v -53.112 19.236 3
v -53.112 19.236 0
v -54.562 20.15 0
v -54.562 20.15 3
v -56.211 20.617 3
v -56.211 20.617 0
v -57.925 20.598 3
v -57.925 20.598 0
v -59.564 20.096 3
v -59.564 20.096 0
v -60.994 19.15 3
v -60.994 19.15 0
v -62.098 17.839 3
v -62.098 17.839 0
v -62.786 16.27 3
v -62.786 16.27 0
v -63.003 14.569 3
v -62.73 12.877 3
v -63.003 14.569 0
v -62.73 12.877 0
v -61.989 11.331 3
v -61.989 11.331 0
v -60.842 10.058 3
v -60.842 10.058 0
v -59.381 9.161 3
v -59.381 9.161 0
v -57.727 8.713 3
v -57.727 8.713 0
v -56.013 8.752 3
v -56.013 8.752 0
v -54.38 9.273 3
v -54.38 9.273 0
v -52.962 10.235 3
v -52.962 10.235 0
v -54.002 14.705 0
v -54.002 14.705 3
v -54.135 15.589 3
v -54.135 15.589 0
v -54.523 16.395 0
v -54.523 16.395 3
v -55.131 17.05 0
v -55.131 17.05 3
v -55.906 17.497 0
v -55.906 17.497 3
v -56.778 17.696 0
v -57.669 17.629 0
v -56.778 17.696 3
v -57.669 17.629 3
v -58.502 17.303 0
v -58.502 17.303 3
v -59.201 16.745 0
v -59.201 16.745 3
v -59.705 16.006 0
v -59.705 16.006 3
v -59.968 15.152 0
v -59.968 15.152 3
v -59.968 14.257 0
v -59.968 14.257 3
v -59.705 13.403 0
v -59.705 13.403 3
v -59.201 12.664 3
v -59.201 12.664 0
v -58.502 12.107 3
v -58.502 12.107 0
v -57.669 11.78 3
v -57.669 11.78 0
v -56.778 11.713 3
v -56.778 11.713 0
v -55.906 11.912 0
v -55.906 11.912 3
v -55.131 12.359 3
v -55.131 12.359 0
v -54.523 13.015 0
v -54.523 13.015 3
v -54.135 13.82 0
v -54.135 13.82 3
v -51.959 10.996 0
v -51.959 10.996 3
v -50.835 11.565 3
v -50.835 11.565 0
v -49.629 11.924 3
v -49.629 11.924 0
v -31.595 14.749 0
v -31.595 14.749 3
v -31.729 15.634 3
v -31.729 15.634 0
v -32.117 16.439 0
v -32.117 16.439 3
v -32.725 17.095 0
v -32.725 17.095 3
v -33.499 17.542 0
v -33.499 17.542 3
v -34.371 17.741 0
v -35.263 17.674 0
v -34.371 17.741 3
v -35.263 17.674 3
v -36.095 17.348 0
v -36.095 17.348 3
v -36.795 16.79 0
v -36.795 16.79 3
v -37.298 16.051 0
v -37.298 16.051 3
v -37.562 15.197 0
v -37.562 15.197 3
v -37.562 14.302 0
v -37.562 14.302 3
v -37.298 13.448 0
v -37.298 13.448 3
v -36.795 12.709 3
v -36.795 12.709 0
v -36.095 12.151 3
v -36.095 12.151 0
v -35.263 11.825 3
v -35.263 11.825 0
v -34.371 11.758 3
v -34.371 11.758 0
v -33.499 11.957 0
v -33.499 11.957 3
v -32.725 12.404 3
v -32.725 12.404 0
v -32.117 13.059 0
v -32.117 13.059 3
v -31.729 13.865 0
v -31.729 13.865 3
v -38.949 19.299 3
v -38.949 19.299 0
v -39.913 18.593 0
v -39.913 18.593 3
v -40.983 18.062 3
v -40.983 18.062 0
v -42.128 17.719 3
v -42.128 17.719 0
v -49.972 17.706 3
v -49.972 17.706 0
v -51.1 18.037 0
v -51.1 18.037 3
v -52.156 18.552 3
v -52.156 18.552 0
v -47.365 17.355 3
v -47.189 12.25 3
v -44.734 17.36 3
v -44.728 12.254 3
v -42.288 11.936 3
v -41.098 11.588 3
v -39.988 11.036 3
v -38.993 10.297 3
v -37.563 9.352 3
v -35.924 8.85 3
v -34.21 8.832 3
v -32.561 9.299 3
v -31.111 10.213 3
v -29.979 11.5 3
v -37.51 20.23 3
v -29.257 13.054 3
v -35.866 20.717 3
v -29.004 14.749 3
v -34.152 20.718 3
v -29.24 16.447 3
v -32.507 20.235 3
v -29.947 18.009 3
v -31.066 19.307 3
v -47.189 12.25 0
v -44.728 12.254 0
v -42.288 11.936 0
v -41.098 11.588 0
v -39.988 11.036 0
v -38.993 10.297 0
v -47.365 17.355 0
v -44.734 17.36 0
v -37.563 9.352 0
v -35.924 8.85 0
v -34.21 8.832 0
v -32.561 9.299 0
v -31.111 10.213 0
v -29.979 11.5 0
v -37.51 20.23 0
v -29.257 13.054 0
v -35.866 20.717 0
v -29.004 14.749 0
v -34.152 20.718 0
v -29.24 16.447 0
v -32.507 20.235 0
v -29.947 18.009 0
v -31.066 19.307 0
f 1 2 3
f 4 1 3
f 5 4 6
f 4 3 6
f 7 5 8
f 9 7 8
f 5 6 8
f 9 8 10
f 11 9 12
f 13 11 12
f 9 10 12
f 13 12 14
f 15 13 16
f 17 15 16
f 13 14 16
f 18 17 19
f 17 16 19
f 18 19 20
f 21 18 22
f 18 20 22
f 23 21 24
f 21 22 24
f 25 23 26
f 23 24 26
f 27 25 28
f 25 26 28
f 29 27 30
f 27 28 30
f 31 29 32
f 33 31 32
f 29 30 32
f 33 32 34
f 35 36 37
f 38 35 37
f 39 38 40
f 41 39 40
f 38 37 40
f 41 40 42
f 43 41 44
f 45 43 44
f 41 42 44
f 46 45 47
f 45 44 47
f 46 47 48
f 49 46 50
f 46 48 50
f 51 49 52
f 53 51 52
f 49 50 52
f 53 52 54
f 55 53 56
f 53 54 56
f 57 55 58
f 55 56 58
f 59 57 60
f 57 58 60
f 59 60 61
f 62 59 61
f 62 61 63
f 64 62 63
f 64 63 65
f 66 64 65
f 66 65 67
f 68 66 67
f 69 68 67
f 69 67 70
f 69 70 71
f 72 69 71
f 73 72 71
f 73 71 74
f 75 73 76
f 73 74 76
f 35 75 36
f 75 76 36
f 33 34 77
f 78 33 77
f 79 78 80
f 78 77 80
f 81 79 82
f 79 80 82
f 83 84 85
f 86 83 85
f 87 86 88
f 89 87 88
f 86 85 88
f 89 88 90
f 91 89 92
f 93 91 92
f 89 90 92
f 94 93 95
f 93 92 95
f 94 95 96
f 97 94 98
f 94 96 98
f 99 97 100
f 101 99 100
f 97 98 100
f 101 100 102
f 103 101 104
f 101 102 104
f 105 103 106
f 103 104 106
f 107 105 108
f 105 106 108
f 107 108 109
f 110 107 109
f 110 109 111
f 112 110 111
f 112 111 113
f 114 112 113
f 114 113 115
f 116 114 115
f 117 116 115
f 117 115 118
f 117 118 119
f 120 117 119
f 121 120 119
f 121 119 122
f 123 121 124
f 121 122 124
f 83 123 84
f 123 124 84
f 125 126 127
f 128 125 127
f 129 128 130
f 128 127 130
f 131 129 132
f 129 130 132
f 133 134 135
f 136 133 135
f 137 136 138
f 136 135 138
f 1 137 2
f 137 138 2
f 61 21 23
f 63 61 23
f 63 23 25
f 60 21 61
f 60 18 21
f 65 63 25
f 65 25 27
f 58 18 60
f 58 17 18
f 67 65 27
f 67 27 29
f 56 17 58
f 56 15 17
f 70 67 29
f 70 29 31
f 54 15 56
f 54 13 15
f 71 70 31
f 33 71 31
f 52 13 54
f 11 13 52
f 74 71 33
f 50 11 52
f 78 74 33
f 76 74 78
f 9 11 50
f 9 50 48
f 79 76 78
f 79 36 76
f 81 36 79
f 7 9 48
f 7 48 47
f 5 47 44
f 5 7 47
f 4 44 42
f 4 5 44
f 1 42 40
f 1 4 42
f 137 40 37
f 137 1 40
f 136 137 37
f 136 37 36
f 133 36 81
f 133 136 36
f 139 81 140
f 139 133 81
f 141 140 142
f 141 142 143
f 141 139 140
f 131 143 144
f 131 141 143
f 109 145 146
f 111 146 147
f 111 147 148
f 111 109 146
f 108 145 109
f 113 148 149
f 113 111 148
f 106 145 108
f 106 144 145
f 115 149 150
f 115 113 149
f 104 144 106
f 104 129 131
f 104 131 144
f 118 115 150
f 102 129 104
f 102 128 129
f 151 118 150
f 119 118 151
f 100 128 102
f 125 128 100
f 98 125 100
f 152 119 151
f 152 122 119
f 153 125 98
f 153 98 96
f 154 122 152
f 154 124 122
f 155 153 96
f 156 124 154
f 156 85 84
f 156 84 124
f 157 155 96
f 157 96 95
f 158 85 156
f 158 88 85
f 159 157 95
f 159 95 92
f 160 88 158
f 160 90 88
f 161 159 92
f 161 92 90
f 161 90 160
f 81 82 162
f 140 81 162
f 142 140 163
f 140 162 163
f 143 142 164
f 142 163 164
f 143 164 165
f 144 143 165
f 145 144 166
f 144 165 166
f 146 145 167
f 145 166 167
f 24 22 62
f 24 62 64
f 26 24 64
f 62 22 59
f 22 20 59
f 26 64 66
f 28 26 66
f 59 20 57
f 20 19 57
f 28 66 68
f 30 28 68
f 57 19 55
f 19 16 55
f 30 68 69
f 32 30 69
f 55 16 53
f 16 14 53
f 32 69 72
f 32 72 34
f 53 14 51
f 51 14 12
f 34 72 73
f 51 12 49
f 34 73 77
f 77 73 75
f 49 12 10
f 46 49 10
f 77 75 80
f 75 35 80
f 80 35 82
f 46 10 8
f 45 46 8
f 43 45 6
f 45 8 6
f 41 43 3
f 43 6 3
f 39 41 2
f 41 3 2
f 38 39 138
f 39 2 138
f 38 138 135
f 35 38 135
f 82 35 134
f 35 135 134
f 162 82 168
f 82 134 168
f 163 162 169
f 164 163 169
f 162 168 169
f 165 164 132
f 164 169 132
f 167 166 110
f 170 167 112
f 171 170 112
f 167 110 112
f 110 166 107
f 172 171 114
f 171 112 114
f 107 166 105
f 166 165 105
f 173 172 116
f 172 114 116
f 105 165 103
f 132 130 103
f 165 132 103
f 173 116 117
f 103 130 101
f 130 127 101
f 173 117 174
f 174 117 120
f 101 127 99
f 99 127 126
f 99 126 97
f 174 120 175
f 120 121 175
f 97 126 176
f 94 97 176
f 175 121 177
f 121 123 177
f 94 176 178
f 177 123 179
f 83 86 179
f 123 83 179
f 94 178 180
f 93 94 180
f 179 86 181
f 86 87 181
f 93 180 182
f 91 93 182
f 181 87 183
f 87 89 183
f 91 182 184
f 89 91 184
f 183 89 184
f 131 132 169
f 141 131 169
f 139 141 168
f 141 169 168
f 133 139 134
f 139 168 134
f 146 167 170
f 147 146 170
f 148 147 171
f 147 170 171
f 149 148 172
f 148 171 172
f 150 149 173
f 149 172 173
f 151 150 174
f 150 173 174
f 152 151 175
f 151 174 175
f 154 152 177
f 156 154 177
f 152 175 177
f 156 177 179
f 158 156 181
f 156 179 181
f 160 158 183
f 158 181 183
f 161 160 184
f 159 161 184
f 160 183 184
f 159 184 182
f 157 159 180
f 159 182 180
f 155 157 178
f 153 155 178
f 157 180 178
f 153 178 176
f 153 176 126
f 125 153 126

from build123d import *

# Parameters (mm, degrees)
BOSS_EXTRUDE1_DEPTH = 3
SKETCH2_R           = 3
CUT_EXTRUDE1_DEPTH  = 3


with BuildPart() as part:
    # Sketch1 → Boss-Extrude1 (new body)
    with BuildSketch(Plane.XY):
        with BuildLine():
            ThreePointArc((-38.993072638, 10.297497813), (-29.003536718, 14.749442663), (-38.948867239, 19.299282405))
            ThreePointArc((-38.948867239, 19.299282405), (-40.43645285, 18.304531068), (-42.127647344, 17.719464956))
            ThreePointArc((-42.127647344, 17.719464956), (-46.049056408, 17.312851184), (-49.971869959, 17.705684038))
            ThreePointArc((-49.971869959, 17.705684038), (-51.638902703, 18.27196215), (-53.111913064, 19.236280328))
            ThreePointArc((-53.111913064, 19.236280328), (-63.002628538, 14.569315621), (-52.961652305, 10.235078841))
            ThreePointArc((-52.961652305, 10.235078841), (-51.409870812, 11.305926496), (-49.628578883, 11.923777258))
            ThreePointArc((-49.628578883, 11.923777258), (-45.958785243, 12.292784959), (-42.287798819, 11.935838578))
            ThreePointArc((-42.287798819, 11.935838578), (-40.530859131, 11.337028267), (-38.993072638, 10.297497813))
        make_face()
    extrude(amount=BOSS_EXTRUDE1_DEPTH)

    # Sketch2 → Cut-Extrude1 (cut)
    with BuildSketch(Plane.XY.offset(3)):
        with Locations((-57.001914988, 14.704587642)):
            Circle(SKETCH2_R)
        with Locations((-34.595484072, 14.749442663)):
            Circle(SKETCH2_R)
    extrude(amount=-CUT_EXTRUDE1_DEPTH, mode=Mode.SUBTRACT)


solid = part.part
